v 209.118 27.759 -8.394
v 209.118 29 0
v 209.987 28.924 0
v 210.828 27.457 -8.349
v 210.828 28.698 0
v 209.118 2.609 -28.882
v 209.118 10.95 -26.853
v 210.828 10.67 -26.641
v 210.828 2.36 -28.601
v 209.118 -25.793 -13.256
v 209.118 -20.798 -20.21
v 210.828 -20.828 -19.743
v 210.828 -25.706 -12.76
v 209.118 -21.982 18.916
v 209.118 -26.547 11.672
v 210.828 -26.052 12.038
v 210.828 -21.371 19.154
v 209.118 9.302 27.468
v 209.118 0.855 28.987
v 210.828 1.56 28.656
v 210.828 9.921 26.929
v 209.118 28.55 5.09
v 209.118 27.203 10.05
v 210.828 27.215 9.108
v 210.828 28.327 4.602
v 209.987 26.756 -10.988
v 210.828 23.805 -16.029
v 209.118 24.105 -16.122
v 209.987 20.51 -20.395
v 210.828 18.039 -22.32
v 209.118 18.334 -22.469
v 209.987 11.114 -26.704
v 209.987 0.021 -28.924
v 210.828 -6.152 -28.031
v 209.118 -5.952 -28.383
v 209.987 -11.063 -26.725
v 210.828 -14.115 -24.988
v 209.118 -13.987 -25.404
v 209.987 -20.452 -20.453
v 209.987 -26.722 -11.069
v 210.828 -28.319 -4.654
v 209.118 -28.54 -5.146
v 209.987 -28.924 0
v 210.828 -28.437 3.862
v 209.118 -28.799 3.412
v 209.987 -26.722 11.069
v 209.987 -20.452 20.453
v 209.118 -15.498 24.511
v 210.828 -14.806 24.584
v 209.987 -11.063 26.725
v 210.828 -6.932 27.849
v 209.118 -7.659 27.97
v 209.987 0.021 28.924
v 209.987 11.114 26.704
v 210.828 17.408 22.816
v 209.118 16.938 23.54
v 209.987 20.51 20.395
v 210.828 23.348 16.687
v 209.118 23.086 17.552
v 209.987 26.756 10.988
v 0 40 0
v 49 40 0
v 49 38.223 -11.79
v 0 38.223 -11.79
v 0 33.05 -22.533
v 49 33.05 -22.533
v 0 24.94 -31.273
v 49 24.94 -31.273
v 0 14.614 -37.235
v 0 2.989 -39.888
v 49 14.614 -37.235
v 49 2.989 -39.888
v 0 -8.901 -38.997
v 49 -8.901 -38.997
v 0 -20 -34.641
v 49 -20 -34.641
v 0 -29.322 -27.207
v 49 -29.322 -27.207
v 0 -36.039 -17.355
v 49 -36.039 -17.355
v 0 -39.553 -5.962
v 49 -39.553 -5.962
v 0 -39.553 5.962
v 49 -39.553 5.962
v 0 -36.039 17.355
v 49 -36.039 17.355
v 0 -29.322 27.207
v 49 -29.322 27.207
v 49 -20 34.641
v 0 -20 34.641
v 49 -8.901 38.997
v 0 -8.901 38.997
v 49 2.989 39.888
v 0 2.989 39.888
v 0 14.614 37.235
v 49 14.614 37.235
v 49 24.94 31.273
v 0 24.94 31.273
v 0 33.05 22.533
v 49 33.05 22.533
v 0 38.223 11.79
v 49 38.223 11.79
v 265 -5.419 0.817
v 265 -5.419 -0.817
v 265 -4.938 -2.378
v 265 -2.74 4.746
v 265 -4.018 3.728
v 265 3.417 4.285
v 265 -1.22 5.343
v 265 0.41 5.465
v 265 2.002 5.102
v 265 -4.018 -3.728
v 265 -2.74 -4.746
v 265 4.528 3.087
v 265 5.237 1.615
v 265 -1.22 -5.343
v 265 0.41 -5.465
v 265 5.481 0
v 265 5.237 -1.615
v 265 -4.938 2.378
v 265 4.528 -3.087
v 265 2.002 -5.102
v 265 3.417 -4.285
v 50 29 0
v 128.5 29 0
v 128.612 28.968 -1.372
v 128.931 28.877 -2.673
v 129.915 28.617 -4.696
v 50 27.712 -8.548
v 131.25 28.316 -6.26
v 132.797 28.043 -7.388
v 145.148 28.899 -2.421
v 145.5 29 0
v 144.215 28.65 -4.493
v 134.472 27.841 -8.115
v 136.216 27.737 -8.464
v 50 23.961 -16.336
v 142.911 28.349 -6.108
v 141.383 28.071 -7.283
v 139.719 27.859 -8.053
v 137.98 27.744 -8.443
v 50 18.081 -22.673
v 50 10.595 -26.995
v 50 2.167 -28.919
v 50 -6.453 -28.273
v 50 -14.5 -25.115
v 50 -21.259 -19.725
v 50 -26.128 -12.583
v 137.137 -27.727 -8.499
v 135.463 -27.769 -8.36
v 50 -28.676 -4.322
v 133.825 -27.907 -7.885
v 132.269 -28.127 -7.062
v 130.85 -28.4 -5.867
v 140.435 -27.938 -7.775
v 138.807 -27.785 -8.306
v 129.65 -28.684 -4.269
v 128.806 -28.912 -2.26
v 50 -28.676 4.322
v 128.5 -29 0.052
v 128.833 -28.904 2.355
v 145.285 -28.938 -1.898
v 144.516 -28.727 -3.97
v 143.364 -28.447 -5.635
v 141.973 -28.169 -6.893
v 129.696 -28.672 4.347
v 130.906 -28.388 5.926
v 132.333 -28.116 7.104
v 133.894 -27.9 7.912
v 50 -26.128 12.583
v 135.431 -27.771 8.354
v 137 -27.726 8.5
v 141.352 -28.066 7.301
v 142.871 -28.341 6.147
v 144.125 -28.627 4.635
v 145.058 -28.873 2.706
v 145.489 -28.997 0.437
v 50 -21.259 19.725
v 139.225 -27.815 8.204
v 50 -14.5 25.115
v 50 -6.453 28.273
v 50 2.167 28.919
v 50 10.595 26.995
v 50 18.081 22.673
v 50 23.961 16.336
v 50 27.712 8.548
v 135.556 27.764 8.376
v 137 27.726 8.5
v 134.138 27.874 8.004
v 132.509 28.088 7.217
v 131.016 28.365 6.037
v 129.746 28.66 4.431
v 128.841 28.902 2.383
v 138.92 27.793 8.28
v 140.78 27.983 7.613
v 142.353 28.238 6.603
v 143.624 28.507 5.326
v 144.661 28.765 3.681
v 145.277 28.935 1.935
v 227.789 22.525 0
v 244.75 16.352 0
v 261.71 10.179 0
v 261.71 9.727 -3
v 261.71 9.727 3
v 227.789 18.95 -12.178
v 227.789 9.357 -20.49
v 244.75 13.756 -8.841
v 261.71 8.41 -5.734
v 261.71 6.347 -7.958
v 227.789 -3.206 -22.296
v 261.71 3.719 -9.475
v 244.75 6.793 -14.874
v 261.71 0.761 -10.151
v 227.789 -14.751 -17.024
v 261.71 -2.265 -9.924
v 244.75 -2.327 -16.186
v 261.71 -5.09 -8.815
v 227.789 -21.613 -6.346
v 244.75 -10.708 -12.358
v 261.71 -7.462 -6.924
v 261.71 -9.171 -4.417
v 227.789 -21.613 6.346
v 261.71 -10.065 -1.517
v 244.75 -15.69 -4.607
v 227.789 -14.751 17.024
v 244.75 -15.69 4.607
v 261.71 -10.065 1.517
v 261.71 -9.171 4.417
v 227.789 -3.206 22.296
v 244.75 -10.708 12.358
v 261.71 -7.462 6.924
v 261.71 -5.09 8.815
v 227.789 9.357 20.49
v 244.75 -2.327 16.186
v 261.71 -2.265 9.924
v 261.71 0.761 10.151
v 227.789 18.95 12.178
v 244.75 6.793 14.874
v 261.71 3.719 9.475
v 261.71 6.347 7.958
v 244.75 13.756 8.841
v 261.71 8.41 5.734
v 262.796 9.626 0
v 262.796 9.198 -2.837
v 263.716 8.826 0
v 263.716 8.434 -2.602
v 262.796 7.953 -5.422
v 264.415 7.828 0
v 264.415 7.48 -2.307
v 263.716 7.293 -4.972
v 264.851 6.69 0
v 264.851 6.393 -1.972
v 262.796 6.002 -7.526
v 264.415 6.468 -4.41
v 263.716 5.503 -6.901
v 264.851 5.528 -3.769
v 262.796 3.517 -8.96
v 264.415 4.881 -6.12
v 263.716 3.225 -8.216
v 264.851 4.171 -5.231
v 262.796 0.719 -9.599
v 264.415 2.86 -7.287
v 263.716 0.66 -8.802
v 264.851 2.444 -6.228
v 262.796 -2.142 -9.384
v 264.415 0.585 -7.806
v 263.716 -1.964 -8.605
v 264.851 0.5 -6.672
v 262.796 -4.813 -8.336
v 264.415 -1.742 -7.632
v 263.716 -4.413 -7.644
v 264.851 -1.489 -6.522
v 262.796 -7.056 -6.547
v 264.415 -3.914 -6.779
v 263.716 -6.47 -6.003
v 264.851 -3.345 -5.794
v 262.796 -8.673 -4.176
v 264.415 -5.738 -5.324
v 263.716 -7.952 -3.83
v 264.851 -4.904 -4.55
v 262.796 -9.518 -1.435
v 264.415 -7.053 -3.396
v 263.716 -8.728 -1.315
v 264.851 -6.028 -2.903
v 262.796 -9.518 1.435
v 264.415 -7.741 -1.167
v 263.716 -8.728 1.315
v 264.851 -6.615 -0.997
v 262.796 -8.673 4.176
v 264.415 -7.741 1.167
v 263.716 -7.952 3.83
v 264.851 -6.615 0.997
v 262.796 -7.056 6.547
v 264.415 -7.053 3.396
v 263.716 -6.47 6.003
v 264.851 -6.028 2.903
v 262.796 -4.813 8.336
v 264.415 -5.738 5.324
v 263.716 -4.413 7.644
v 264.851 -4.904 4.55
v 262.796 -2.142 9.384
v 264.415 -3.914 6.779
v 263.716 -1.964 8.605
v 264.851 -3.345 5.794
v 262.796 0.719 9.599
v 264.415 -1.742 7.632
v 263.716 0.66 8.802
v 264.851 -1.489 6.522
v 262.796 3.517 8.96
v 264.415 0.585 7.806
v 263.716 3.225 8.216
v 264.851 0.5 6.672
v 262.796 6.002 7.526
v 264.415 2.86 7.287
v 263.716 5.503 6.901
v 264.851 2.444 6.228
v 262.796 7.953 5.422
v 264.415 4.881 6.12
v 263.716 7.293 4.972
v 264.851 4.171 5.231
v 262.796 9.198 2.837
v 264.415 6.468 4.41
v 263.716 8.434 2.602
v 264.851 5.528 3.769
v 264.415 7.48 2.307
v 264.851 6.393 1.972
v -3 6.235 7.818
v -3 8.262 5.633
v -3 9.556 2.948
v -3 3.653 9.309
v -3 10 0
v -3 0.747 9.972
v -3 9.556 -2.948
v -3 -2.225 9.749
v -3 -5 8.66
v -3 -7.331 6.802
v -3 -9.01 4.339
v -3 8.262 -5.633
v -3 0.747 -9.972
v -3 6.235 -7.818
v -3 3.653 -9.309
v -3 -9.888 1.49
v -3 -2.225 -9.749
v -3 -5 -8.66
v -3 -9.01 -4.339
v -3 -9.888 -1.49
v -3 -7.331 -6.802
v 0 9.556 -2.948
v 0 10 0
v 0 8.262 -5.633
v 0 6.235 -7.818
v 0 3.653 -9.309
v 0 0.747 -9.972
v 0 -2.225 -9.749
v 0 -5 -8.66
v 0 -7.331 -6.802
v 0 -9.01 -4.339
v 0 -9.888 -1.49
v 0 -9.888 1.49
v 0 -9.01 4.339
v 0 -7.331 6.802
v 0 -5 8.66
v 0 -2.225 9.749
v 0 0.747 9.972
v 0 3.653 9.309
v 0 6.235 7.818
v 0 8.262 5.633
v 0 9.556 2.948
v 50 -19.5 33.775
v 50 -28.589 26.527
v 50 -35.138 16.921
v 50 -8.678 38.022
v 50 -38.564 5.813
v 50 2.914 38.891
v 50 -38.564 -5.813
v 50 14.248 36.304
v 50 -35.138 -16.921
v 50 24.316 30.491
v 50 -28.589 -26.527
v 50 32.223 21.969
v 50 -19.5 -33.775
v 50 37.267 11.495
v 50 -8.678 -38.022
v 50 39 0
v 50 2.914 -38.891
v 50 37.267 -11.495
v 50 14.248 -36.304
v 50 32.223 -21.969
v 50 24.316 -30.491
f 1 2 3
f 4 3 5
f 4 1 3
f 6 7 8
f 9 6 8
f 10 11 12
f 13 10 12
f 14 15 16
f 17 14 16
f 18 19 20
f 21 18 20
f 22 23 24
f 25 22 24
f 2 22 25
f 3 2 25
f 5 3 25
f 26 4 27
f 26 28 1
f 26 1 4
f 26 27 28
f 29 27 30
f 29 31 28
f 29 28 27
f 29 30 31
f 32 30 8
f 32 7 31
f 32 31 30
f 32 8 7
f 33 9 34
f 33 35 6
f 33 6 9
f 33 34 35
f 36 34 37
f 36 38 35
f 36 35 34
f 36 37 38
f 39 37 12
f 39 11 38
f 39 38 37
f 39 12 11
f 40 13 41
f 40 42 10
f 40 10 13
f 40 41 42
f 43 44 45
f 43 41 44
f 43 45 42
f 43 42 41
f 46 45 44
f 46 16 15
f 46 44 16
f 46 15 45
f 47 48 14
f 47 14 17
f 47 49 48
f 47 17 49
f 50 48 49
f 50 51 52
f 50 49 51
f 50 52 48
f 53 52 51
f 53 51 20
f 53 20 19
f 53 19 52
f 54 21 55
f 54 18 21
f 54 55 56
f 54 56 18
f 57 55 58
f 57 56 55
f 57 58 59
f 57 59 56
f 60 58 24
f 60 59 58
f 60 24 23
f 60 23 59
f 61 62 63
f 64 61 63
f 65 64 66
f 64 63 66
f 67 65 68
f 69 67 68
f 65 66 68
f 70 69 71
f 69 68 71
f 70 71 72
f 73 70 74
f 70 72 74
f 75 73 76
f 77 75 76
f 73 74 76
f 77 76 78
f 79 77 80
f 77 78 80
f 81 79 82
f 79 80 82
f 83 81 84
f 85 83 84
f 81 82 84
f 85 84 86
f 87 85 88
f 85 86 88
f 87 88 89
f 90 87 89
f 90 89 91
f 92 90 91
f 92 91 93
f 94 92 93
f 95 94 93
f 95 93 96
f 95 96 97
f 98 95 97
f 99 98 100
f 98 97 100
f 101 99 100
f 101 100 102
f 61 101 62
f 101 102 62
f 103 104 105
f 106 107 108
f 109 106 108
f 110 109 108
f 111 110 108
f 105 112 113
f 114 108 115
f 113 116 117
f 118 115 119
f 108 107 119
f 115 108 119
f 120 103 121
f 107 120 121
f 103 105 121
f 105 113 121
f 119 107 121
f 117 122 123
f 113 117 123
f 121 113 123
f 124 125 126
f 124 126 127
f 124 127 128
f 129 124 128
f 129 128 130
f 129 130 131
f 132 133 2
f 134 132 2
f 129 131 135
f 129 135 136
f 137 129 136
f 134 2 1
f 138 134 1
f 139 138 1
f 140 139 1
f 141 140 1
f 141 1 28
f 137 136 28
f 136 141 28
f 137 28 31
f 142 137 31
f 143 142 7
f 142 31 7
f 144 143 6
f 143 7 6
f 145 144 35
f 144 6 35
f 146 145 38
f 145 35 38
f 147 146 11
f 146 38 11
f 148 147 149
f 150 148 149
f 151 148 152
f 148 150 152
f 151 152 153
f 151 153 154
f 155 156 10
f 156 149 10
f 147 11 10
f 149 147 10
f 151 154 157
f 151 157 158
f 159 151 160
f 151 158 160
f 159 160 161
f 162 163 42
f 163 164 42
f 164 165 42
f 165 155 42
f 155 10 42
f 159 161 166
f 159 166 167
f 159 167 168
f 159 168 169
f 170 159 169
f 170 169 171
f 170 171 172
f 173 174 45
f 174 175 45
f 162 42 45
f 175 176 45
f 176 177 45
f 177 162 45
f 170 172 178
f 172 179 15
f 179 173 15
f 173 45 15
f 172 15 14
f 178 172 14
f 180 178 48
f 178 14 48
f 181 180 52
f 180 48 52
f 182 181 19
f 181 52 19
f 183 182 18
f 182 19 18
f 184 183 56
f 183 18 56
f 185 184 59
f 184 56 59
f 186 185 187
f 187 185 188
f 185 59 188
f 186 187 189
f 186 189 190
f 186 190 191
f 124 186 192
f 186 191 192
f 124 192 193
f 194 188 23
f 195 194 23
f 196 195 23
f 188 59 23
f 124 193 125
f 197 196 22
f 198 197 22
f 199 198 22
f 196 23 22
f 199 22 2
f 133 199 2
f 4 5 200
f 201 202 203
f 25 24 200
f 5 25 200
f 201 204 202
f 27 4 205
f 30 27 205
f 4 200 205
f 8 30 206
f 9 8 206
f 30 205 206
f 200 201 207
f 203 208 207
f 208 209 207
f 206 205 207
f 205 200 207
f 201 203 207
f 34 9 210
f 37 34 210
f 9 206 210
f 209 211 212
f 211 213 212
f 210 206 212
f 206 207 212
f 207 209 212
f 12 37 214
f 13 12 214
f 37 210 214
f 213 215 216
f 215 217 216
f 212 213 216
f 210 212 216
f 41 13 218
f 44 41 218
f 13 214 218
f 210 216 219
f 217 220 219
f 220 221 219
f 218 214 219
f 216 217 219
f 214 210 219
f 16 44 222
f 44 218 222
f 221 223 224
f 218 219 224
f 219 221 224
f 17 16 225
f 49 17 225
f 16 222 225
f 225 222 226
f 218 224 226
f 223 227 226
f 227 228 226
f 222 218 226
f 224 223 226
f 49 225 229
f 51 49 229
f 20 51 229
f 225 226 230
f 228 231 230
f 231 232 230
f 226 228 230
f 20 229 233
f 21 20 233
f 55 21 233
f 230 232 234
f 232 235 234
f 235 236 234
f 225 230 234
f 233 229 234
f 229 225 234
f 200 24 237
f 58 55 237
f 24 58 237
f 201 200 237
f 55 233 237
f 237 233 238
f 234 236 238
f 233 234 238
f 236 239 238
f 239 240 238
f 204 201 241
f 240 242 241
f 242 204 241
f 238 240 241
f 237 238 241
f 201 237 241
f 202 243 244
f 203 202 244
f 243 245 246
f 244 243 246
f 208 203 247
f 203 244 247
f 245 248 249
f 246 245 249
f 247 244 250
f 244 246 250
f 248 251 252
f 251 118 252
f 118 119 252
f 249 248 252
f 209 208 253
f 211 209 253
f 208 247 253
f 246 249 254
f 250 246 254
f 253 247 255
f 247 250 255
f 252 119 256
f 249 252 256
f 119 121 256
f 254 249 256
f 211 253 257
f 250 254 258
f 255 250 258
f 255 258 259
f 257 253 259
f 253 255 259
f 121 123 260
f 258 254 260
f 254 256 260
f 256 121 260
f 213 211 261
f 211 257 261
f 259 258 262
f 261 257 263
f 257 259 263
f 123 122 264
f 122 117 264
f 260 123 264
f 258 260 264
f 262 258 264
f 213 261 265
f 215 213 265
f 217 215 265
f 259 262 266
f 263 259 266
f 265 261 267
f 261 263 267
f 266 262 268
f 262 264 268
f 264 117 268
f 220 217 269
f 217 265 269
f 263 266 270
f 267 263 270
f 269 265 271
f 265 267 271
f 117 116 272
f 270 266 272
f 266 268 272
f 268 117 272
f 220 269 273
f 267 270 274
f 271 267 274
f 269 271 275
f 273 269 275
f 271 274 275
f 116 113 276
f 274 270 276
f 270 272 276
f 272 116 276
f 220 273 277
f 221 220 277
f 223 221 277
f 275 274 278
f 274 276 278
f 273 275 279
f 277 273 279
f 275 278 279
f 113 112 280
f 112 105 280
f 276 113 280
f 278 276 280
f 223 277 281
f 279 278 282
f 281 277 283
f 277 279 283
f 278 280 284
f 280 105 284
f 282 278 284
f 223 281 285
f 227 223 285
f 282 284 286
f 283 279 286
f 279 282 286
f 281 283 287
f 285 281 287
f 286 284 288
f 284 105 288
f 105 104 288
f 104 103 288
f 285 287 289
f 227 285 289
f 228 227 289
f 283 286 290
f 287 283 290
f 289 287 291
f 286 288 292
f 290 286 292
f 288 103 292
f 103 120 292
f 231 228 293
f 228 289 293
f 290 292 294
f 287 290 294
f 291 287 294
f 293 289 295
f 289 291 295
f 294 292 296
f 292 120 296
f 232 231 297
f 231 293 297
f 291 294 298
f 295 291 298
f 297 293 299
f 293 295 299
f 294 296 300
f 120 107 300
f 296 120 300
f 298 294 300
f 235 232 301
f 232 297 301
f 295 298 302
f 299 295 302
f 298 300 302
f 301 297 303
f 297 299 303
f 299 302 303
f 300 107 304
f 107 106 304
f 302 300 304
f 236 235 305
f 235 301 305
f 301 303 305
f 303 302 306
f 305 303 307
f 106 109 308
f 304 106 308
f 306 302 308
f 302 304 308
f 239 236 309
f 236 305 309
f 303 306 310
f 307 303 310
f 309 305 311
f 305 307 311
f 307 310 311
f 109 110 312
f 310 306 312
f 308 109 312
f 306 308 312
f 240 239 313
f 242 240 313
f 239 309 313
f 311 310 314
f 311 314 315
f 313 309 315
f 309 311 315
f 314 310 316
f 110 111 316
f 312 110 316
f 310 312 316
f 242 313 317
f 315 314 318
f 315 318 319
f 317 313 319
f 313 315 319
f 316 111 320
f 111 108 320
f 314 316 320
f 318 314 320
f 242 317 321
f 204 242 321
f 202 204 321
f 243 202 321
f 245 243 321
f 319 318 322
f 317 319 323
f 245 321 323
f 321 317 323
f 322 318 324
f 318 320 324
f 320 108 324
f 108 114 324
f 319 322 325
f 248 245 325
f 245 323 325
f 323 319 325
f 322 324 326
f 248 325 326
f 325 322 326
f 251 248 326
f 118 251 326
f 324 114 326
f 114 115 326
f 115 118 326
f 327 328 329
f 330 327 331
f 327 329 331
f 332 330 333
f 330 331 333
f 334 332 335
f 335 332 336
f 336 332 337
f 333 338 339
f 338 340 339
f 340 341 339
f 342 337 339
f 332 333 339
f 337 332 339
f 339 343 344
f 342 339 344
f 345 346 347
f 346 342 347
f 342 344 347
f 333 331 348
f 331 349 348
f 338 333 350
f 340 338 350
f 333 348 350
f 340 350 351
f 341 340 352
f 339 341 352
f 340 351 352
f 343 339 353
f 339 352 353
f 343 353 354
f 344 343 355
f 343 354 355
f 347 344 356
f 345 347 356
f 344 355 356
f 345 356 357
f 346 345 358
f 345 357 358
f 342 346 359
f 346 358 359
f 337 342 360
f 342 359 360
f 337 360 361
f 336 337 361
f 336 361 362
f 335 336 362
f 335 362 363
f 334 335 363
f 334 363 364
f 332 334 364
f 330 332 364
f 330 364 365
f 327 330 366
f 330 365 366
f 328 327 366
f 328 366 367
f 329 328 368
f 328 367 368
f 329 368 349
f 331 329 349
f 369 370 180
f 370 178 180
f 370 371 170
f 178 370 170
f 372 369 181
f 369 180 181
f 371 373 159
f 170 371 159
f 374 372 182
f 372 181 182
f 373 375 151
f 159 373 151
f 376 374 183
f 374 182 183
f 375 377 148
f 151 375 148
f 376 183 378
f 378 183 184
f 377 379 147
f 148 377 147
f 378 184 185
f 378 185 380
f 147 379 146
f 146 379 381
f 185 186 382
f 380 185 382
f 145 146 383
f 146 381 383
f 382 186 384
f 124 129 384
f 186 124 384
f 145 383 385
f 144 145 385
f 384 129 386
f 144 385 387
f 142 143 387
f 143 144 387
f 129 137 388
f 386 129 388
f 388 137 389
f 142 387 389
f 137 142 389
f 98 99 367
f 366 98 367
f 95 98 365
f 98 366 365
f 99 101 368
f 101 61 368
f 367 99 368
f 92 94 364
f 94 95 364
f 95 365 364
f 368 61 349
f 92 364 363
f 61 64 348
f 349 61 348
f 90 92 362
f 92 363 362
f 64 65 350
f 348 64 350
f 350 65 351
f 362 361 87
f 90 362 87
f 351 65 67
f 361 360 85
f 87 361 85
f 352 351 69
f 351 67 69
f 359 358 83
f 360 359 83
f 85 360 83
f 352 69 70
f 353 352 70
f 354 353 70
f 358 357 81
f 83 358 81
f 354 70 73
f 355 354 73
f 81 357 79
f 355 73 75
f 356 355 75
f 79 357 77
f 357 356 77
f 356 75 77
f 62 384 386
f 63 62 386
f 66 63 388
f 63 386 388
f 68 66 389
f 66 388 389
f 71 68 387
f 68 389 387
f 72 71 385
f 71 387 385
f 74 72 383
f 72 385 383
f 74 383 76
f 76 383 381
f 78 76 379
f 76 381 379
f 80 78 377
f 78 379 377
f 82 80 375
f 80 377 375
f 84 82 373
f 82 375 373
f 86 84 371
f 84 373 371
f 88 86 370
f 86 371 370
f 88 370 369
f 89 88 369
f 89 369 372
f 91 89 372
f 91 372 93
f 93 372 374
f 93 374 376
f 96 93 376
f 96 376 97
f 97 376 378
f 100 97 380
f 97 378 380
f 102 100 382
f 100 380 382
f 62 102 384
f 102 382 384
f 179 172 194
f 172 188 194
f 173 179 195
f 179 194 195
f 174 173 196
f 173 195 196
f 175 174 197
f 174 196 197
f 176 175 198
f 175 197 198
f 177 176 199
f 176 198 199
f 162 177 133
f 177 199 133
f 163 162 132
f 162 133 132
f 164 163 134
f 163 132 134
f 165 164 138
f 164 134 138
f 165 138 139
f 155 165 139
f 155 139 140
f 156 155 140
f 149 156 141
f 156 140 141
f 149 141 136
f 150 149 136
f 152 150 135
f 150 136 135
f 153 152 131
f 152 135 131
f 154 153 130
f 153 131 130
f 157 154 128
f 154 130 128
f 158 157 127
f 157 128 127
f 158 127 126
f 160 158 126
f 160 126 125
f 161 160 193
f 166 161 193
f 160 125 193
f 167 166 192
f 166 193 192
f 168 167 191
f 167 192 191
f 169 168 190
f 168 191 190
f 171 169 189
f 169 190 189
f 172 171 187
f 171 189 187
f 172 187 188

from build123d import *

# Parameters (mm, degrees)
FASE1_SIZE                      = 1
VERRUNDUNG1_R                   = 5
SKIZZE2_R                       = 8.5
SCHNITT_LINEAR_AUSTRAGEN1_DEPTH = 55


with BuildPart() as part:
    # Skizze1 → Rotation1 (revolve)
    with BuildSketch(Plane.XY):
        Polygon((0, 40), (50, 40), (50, 29), (210, 29), (265, 8.981637115), (265, 0), (0, 0), (-3, 0), (-3, 10), (0, 10), align=None)
    revolve(axis=Axis((265, 0, 0), (-1, 0, 0)))

    # Fase1
    fase1_edges = [part.edges().sort_by_distance(p)[0] for p in [
        (50, -40, 0),
    ]]
    chamfer(fase1_edges, length=FASE1_SIZE)

    # Verrundung1
    verrundung1_edges = [part.edges().sort_by_distance(p)[0] for p in [
        (265, -8.981637115, 0),
        (210, -29, 0),
    ]]
    fillet(verrundung1_edges, radius=VERRUNDUNG1_R)

    # Skizze2 → Schnitt-Linear austragen1 (cut, symmetric)
    with BuildSketch(Plane(origin=(0, 0, 0), x_dir=(1, 0, 0), z_dir=(0, 1, 0))):
        with Locations(Location((137, 0, 0), (0, 0, 270))):  # turned: the seam where the file's is
            Circle(SKIZZE2_R)
    extrude(amount=SCHNITT_LINEAR_AUSTRAGEN1_DEPTH, both=True, mode=Mode.SUBTRACT)


solid = part.part
